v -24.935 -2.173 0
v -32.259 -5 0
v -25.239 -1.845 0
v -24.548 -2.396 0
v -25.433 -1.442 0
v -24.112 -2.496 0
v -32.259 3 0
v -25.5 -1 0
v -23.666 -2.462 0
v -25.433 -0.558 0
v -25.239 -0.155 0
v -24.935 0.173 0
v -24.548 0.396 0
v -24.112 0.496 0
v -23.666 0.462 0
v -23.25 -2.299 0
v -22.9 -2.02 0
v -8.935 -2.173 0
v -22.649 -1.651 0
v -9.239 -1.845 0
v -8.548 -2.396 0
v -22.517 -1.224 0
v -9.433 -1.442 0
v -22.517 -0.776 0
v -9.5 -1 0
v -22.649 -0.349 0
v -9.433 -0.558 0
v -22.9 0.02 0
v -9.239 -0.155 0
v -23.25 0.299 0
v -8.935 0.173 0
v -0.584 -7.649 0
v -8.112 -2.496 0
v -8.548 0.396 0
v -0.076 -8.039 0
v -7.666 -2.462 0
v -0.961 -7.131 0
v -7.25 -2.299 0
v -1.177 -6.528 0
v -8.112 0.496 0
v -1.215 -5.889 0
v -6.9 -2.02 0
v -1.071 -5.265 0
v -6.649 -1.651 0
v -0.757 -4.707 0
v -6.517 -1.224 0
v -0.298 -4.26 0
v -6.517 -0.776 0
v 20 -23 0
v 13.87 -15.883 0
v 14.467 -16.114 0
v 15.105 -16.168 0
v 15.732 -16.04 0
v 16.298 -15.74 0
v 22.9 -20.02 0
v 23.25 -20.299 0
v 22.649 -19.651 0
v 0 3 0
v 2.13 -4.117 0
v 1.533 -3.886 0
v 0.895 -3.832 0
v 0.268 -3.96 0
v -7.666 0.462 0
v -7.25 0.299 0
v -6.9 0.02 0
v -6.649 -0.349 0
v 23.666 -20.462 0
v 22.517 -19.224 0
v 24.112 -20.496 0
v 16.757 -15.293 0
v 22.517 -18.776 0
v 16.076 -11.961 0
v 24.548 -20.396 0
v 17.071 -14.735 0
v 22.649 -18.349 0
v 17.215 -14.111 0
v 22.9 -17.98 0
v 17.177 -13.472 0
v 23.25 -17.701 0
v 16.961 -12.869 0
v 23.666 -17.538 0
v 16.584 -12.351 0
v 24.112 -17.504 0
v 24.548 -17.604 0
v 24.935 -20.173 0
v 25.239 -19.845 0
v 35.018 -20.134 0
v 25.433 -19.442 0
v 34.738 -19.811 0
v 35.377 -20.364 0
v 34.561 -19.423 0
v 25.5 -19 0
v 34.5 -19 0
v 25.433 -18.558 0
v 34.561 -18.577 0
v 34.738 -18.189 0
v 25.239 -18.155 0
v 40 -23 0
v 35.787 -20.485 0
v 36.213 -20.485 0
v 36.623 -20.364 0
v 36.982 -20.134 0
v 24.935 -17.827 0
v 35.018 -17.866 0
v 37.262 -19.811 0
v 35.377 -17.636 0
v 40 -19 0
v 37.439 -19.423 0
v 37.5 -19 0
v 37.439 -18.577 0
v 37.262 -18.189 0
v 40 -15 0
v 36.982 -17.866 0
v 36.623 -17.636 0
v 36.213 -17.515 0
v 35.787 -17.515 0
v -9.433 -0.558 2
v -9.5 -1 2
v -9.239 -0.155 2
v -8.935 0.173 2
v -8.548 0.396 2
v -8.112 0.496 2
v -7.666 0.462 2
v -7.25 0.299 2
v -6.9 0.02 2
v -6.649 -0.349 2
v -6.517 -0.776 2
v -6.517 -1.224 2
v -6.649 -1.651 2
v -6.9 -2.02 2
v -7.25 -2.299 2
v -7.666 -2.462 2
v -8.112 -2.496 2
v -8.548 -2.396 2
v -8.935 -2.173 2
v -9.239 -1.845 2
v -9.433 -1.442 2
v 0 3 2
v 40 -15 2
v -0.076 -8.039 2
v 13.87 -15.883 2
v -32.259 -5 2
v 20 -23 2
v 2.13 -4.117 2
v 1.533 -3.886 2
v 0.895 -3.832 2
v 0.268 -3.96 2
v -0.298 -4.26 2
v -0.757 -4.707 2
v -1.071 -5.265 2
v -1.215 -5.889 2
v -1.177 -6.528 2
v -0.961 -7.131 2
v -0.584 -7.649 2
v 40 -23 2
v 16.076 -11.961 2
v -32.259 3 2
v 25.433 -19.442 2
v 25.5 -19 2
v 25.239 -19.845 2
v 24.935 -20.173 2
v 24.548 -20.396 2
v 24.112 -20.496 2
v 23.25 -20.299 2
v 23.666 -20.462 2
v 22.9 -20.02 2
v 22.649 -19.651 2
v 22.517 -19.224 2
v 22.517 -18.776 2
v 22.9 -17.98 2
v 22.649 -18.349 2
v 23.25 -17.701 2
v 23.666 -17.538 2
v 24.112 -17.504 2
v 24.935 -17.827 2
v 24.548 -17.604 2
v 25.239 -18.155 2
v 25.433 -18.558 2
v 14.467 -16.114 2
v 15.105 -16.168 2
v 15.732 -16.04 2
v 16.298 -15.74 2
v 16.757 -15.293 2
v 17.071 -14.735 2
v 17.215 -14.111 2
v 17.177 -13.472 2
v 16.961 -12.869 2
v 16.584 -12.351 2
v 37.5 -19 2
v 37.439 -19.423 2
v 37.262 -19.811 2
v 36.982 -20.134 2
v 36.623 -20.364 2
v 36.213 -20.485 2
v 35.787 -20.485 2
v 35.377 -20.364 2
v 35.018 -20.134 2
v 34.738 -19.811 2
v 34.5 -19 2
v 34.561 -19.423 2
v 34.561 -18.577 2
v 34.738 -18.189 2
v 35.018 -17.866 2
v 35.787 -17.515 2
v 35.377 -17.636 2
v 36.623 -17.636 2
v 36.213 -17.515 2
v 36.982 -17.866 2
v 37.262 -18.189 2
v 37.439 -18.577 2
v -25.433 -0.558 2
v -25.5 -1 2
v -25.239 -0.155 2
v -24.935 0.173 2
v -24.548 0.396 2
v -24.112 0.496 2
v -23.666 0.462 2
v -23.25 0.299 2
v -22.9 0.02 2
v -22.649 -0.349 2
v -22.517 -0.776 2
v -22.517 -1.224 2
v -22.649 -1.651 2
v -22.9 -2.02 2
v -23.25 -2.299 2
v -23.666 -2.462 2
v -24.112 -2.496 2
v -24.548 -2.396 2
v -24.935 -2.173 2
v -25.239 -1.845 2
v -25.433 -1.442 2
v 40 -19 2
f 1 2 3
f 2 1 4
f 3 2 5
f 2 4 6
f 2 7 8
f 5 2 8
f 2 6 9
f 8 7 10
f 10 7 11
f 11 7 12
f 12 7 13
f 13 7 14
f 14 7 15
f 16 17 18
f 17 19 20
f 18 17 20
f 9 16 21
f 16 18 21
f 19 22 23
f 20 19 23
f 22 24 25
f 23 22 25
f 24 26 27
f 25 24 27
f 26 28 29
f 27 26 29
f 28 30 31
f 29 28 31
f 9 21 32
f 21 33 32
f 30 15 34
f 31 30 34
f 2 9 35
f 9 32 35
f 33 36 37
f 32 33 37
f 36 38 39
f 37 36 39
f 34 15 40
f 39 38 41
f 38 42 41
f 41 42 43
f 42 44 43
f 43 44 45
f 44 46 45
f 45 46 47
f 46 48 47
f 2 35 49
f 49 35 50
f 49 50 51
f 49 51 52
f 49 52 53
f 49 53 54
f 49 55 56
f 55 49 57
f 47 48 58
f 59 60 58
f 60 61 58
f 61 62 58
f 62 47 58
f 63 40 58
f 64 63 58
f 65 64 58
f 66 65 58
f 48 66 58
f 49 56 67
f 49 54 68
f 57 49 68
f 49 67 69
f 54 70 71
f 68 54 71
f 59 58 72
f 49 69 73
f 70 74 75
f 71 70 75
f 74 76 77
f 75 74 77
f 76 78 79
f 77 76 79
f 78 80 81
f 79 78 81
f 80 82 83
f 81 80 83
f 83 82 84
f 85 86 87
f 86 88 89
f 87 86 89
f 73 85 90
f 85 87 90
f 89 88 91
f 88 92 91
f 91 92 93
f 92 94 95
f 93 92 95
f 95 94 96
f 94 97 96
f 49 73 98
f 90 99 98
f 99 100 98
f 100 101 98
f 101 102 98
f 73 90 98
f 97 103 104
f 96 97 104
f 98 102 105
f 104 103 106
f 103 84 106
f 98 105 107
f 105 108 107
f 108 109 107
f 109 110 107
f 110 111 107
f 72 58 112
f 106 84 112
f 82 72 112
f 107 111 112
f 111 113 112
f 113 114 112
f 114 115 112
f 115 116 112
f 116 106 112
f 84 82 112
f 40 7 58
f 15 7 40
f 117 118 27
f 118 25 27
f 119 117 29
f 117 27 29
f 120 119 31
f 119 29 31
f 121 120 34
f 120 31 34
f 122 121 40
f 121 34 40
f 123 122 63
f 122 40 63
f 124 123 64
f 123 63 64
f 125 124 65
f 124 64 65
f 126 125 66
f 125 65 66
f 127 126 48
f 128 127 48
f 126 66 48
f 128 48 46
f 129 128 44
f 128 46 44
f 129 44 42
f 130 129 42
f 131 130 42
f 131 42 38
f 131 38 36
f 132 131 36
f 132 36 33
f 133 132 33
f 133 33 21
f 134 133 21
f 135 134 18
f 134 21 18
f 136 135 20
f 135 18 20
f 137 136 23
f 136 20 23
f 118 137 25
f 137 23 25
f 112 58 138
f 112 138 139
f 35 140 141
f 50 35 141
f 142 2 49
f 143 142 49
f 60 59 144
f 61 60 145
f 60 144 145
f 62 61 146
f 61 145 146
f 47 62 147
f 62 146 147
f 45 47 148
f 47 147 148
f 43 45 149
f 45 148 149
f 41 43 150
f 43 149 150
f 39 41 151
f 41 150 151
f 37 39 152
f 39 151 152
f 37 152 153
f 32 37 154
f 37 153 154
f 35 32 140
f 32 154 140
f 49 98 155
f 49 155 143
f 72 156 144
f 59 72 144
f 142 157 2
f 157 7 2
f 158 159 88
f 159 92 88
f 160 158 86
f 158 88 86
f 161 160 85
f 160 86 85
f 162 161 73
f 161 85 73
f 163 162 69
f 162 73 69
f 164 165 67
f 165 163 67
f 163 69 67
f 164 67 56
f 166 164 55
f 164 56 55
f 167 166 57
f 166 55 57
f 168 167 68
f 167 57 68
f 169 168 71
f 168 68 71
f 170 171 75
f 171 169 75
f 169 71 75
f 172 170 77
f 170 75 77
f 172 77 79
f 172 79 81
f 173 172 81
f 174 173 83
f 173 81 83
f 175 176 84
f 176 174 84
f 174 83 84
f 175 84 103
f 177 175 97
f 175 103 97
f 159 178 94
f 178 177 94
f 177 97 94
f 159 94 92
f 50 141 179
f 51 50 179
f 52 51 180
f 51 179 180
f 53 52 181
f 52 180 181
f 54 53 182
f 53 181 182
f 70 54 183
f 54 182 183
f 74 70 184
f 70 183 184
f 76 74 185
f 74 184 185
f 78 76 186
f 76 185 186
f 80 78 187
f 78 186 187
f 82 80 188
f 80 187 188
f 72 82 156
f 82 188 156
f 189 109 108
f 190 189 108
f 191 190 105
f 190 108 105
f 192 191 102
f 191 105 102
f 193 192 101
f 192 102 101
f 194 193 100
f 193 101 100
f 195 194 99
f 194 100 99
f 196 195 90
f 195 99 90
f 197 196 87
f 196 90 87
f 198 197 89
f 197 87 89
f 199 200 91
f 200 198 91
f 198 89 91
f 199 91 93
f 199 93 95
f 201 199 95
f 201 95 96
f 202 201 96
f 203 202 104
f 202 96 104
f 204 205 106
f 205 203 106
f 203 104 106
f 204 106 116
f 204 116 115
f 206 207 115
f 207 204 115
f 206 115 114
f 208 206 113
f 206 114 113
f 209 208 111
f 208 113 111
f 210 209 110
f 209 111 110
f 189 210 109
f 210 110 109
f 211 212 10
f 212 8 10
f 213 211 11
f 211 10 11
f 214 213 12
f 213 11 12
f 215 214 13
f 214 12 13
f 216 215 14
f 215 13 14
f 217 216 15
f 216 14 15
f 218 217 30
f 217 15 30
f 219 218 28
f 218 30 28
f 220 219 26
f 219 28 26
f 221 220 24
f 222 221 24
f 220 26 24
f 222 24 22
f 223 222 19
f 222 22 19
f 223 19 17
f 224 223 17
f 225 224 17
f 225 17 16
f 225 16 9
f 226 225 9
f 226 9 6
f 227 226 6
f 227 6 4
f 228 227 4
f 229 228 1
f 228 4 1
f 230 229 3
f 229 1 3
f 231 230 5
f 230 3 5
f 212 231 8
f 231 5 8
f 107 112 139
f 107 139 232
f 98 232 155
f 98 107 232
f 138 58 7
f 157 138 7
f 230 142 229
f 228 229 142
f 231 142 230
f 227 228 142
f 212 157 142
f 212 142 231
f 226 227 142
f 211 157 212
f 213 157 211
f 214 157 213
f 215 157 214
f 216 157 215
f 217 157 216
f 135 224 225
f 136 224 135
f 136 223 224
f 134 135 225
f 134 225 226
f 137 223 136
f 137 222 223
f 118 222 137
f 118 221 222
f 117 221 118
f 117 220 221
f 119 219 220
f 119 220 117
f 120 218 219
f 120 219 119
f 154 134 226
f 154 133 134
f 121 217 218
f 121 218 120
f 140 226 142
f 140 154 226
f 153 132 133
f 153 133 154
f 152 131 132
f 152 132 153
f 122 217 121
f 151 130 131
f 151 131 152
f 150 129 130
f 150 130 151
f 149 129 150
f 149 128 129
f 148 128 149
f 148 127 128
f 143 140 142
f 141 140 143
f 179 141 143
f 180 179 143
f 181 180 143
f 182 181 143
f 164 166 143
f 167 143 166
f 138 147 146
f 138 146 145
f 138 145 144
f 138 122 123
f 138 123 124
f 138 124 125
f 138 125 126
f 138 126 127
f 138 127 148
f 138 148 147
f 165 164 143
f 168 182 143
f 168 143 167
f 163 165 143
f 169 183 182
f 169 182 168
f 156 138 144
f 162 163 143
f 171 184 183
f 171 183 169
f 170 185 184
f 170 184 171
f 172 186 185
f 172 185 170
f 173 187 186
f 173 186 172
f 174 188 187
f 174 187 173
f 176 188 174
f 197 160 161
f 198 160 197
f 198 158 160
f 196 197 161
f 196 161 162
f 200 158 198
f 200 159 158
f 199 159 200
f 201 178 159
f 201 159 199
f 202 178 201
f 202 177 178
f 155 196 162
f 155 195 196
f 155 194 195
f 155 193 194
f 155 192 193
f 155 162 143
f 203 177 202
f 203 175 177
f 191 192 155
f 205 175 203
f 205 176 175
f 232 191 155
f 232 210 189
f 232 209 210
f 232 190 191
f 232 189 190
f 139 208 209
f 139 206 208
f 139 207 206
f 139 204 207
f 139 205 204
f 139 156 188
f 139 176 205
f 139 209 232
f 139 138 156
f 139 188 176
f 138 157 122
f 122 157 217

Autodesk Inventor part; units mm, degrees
ref_plane "YZ Plane" through (0, 0, 0) normal (1, 0, 0) x (0, 1, 0)
ref_plane "XZ Plane" through (0, 0, 0) normal (0, 1, 0) x (-1, 0, 0)
ref_plane "XY Plane" through (0, 0, 0) normal (0, 0, 1) x (1, 0, 0)
sketch "Sketch1" plane through (0, 0, 0) normal (0, 0, 1) x (1, 0, 0)
  line L0 (-158.3346, -22.9633) -> (-158.3346, -15.0367) projected
  arc A0 (-32.2589, 3) -> (-35, 2.3373) centre (-32.2589, -3) ccw projected
  line L1 (-35, 2.3373) -> (-35, -5) projected
  line L2 (0, -5) -> (-35, -5) projected
  line L3 (0, 3) -> (0, -5) projected
  line L4 (0, 3) -> (-32.2589, 3) projected
  circle A1 centre (-8, -1) radius 2 projected
  circle A2 centre (-24, -1) radius 2 projected
  line L5 (-158.3346, -19) -> (0, -19)
  line L6 (-64, 3) -> (-56, 3) projected
  line L7 (-60, 3) -> (-60, 13)
  line L8 (-60, 13) -> (50, 13)
  line L9 (-32.2589, 3) -> (-32.2589, -5)
  line L10 (50, 13) -> (50, -19)
  line L11 (50, -19) -> (40, -19)
  line L12 (40, -19) -> (30, -19)
  line L13 (20, -15) -> (40, -15)
  line L14 (40, -15) -> (40, -23)
  line L15 (40, -23) -> (20, -23)
  line L16 (20, -23) -> (20, -15)
  line L17 (20, -15) -> (40, -23) construction
  line L18 (40, -15) -> (20, -23) construction
  line L19 (0, 3) -> (40, -15)
  line L20 (30, -19) -> (24, -19)
  circle A3 centre (24, -19) radius 1.5
  line L21 (30, -19) -> (36, -19)
  circle A4 centre (36, -19) radius 1.5
  line L22 (-32.2589, -5) -> (20, -23)
  point P0 (0, 0)
  dimension "d0" = 10
  dimension "d1" = 110
  dimension "d2" = 32
  dimension "d3" = 10
  dimension "d4" = 10
  dimension "d5" = 20
  dimension "d6" = 8
  dimension "d7" = 6
  dimension "d8" = 3
  dimension "d9" = 6
  dimension "d10" = 3
extrude "Extrusion1" add sketch "Sketch1" along normal blind 2 contours L4 L3 L2 L9 | L19 L13 L16 L22 L2 L3 | L14 L15 L16 L13
sketch "Sketch3" plane through (0, 0, 0) normal (0, 0, -1) x (-1, 0, 0)
  line L0 (0, 3) -> (32.2589, 3) projected
  line L1 (-40, -15) -> (0, 3) projected
  line L2 (-40, -23) -> (-40, -15) projected
  line L3 (-20, -23) -> (-40, -23) projected
  line L4 (32.2589, -5) -> (-20, -23) projected
  line L5 (32.2589, 3) -> (32.2589, -5) projected
  circle A0 centre (-36, -19) radius 1.5 projected
  circle A1 centre (-24, -19) radius 1.5 projected
  circle A2 centre (24, -1) radius 2 projected
  circle A3 centre (8, -1) radius 2 projected
  circle A4 centre (8, -1) radius 1.5
  circle A5 centre (24, -1) radius 1.5
  point P0 (0, 0)
  dimension "d23" = 3
  dimension "d24" = 3
extrude "Extrusion3" add sketch "Sketch3" against normal blind 2 contours A2 | A3
sketch "Sketch4" plane through (0, 0, 2) normal (0, 0, 1) x (1, 0, 0)
  circle A0 centre (-24, -1) radius 1.5 projected
  circle A1 centre (-8, -1) radius 1.5 projected
  line L0 (-32.2589, 3) -> (-32.2589, -5) projected
  line L1 (-32.2589, -5) -> (20, -23) projected
  line L2 (20, -23) -> (40, -23) projected
  line L3 (40, -23) -> (40, -15) projected
  line L4 (40, -15) -> (0, 3) projected
  line L5 (0, 3) -> (-32.2589, 3) projected
  circle A2 centre (36, -19) radius 1.5 projected
  circle A3 centre (24, -19) radius 1.5 projected
  circle A4 centre (-8, -1) radius 1.5 projected
  line L6 (-8, -1) -> (24, -19)
  line L7 (1.0274, -6.0779) -> (14.9726, -13.9221) construction
  line L8 (-0.0757, -8.039) -> (13.8695, -15.8831)
  line L9 (16.0757, -11.961) -> (2.1305, -4.1169)
  arc A5 (2.1305, -4.1169) -> (-0.0757, -8.039) centre (1.0274, -6.0779) ccw
  arc A6 (13.8695, -15.8831) -> (16.0757, -11.961) centre (14.9726, -13.9221) ccw
  point P0 (0, 0)
  point P1 (8, -10)
  dimension "d27" = 8
  dimension "d28" = 4.5
extrude "Extrusion4" cut sketch "Sketch4" against normal blind 10 contours A5 L9 A6 L6 | L6 A6 L8 A5
properties part number "arm_2"
